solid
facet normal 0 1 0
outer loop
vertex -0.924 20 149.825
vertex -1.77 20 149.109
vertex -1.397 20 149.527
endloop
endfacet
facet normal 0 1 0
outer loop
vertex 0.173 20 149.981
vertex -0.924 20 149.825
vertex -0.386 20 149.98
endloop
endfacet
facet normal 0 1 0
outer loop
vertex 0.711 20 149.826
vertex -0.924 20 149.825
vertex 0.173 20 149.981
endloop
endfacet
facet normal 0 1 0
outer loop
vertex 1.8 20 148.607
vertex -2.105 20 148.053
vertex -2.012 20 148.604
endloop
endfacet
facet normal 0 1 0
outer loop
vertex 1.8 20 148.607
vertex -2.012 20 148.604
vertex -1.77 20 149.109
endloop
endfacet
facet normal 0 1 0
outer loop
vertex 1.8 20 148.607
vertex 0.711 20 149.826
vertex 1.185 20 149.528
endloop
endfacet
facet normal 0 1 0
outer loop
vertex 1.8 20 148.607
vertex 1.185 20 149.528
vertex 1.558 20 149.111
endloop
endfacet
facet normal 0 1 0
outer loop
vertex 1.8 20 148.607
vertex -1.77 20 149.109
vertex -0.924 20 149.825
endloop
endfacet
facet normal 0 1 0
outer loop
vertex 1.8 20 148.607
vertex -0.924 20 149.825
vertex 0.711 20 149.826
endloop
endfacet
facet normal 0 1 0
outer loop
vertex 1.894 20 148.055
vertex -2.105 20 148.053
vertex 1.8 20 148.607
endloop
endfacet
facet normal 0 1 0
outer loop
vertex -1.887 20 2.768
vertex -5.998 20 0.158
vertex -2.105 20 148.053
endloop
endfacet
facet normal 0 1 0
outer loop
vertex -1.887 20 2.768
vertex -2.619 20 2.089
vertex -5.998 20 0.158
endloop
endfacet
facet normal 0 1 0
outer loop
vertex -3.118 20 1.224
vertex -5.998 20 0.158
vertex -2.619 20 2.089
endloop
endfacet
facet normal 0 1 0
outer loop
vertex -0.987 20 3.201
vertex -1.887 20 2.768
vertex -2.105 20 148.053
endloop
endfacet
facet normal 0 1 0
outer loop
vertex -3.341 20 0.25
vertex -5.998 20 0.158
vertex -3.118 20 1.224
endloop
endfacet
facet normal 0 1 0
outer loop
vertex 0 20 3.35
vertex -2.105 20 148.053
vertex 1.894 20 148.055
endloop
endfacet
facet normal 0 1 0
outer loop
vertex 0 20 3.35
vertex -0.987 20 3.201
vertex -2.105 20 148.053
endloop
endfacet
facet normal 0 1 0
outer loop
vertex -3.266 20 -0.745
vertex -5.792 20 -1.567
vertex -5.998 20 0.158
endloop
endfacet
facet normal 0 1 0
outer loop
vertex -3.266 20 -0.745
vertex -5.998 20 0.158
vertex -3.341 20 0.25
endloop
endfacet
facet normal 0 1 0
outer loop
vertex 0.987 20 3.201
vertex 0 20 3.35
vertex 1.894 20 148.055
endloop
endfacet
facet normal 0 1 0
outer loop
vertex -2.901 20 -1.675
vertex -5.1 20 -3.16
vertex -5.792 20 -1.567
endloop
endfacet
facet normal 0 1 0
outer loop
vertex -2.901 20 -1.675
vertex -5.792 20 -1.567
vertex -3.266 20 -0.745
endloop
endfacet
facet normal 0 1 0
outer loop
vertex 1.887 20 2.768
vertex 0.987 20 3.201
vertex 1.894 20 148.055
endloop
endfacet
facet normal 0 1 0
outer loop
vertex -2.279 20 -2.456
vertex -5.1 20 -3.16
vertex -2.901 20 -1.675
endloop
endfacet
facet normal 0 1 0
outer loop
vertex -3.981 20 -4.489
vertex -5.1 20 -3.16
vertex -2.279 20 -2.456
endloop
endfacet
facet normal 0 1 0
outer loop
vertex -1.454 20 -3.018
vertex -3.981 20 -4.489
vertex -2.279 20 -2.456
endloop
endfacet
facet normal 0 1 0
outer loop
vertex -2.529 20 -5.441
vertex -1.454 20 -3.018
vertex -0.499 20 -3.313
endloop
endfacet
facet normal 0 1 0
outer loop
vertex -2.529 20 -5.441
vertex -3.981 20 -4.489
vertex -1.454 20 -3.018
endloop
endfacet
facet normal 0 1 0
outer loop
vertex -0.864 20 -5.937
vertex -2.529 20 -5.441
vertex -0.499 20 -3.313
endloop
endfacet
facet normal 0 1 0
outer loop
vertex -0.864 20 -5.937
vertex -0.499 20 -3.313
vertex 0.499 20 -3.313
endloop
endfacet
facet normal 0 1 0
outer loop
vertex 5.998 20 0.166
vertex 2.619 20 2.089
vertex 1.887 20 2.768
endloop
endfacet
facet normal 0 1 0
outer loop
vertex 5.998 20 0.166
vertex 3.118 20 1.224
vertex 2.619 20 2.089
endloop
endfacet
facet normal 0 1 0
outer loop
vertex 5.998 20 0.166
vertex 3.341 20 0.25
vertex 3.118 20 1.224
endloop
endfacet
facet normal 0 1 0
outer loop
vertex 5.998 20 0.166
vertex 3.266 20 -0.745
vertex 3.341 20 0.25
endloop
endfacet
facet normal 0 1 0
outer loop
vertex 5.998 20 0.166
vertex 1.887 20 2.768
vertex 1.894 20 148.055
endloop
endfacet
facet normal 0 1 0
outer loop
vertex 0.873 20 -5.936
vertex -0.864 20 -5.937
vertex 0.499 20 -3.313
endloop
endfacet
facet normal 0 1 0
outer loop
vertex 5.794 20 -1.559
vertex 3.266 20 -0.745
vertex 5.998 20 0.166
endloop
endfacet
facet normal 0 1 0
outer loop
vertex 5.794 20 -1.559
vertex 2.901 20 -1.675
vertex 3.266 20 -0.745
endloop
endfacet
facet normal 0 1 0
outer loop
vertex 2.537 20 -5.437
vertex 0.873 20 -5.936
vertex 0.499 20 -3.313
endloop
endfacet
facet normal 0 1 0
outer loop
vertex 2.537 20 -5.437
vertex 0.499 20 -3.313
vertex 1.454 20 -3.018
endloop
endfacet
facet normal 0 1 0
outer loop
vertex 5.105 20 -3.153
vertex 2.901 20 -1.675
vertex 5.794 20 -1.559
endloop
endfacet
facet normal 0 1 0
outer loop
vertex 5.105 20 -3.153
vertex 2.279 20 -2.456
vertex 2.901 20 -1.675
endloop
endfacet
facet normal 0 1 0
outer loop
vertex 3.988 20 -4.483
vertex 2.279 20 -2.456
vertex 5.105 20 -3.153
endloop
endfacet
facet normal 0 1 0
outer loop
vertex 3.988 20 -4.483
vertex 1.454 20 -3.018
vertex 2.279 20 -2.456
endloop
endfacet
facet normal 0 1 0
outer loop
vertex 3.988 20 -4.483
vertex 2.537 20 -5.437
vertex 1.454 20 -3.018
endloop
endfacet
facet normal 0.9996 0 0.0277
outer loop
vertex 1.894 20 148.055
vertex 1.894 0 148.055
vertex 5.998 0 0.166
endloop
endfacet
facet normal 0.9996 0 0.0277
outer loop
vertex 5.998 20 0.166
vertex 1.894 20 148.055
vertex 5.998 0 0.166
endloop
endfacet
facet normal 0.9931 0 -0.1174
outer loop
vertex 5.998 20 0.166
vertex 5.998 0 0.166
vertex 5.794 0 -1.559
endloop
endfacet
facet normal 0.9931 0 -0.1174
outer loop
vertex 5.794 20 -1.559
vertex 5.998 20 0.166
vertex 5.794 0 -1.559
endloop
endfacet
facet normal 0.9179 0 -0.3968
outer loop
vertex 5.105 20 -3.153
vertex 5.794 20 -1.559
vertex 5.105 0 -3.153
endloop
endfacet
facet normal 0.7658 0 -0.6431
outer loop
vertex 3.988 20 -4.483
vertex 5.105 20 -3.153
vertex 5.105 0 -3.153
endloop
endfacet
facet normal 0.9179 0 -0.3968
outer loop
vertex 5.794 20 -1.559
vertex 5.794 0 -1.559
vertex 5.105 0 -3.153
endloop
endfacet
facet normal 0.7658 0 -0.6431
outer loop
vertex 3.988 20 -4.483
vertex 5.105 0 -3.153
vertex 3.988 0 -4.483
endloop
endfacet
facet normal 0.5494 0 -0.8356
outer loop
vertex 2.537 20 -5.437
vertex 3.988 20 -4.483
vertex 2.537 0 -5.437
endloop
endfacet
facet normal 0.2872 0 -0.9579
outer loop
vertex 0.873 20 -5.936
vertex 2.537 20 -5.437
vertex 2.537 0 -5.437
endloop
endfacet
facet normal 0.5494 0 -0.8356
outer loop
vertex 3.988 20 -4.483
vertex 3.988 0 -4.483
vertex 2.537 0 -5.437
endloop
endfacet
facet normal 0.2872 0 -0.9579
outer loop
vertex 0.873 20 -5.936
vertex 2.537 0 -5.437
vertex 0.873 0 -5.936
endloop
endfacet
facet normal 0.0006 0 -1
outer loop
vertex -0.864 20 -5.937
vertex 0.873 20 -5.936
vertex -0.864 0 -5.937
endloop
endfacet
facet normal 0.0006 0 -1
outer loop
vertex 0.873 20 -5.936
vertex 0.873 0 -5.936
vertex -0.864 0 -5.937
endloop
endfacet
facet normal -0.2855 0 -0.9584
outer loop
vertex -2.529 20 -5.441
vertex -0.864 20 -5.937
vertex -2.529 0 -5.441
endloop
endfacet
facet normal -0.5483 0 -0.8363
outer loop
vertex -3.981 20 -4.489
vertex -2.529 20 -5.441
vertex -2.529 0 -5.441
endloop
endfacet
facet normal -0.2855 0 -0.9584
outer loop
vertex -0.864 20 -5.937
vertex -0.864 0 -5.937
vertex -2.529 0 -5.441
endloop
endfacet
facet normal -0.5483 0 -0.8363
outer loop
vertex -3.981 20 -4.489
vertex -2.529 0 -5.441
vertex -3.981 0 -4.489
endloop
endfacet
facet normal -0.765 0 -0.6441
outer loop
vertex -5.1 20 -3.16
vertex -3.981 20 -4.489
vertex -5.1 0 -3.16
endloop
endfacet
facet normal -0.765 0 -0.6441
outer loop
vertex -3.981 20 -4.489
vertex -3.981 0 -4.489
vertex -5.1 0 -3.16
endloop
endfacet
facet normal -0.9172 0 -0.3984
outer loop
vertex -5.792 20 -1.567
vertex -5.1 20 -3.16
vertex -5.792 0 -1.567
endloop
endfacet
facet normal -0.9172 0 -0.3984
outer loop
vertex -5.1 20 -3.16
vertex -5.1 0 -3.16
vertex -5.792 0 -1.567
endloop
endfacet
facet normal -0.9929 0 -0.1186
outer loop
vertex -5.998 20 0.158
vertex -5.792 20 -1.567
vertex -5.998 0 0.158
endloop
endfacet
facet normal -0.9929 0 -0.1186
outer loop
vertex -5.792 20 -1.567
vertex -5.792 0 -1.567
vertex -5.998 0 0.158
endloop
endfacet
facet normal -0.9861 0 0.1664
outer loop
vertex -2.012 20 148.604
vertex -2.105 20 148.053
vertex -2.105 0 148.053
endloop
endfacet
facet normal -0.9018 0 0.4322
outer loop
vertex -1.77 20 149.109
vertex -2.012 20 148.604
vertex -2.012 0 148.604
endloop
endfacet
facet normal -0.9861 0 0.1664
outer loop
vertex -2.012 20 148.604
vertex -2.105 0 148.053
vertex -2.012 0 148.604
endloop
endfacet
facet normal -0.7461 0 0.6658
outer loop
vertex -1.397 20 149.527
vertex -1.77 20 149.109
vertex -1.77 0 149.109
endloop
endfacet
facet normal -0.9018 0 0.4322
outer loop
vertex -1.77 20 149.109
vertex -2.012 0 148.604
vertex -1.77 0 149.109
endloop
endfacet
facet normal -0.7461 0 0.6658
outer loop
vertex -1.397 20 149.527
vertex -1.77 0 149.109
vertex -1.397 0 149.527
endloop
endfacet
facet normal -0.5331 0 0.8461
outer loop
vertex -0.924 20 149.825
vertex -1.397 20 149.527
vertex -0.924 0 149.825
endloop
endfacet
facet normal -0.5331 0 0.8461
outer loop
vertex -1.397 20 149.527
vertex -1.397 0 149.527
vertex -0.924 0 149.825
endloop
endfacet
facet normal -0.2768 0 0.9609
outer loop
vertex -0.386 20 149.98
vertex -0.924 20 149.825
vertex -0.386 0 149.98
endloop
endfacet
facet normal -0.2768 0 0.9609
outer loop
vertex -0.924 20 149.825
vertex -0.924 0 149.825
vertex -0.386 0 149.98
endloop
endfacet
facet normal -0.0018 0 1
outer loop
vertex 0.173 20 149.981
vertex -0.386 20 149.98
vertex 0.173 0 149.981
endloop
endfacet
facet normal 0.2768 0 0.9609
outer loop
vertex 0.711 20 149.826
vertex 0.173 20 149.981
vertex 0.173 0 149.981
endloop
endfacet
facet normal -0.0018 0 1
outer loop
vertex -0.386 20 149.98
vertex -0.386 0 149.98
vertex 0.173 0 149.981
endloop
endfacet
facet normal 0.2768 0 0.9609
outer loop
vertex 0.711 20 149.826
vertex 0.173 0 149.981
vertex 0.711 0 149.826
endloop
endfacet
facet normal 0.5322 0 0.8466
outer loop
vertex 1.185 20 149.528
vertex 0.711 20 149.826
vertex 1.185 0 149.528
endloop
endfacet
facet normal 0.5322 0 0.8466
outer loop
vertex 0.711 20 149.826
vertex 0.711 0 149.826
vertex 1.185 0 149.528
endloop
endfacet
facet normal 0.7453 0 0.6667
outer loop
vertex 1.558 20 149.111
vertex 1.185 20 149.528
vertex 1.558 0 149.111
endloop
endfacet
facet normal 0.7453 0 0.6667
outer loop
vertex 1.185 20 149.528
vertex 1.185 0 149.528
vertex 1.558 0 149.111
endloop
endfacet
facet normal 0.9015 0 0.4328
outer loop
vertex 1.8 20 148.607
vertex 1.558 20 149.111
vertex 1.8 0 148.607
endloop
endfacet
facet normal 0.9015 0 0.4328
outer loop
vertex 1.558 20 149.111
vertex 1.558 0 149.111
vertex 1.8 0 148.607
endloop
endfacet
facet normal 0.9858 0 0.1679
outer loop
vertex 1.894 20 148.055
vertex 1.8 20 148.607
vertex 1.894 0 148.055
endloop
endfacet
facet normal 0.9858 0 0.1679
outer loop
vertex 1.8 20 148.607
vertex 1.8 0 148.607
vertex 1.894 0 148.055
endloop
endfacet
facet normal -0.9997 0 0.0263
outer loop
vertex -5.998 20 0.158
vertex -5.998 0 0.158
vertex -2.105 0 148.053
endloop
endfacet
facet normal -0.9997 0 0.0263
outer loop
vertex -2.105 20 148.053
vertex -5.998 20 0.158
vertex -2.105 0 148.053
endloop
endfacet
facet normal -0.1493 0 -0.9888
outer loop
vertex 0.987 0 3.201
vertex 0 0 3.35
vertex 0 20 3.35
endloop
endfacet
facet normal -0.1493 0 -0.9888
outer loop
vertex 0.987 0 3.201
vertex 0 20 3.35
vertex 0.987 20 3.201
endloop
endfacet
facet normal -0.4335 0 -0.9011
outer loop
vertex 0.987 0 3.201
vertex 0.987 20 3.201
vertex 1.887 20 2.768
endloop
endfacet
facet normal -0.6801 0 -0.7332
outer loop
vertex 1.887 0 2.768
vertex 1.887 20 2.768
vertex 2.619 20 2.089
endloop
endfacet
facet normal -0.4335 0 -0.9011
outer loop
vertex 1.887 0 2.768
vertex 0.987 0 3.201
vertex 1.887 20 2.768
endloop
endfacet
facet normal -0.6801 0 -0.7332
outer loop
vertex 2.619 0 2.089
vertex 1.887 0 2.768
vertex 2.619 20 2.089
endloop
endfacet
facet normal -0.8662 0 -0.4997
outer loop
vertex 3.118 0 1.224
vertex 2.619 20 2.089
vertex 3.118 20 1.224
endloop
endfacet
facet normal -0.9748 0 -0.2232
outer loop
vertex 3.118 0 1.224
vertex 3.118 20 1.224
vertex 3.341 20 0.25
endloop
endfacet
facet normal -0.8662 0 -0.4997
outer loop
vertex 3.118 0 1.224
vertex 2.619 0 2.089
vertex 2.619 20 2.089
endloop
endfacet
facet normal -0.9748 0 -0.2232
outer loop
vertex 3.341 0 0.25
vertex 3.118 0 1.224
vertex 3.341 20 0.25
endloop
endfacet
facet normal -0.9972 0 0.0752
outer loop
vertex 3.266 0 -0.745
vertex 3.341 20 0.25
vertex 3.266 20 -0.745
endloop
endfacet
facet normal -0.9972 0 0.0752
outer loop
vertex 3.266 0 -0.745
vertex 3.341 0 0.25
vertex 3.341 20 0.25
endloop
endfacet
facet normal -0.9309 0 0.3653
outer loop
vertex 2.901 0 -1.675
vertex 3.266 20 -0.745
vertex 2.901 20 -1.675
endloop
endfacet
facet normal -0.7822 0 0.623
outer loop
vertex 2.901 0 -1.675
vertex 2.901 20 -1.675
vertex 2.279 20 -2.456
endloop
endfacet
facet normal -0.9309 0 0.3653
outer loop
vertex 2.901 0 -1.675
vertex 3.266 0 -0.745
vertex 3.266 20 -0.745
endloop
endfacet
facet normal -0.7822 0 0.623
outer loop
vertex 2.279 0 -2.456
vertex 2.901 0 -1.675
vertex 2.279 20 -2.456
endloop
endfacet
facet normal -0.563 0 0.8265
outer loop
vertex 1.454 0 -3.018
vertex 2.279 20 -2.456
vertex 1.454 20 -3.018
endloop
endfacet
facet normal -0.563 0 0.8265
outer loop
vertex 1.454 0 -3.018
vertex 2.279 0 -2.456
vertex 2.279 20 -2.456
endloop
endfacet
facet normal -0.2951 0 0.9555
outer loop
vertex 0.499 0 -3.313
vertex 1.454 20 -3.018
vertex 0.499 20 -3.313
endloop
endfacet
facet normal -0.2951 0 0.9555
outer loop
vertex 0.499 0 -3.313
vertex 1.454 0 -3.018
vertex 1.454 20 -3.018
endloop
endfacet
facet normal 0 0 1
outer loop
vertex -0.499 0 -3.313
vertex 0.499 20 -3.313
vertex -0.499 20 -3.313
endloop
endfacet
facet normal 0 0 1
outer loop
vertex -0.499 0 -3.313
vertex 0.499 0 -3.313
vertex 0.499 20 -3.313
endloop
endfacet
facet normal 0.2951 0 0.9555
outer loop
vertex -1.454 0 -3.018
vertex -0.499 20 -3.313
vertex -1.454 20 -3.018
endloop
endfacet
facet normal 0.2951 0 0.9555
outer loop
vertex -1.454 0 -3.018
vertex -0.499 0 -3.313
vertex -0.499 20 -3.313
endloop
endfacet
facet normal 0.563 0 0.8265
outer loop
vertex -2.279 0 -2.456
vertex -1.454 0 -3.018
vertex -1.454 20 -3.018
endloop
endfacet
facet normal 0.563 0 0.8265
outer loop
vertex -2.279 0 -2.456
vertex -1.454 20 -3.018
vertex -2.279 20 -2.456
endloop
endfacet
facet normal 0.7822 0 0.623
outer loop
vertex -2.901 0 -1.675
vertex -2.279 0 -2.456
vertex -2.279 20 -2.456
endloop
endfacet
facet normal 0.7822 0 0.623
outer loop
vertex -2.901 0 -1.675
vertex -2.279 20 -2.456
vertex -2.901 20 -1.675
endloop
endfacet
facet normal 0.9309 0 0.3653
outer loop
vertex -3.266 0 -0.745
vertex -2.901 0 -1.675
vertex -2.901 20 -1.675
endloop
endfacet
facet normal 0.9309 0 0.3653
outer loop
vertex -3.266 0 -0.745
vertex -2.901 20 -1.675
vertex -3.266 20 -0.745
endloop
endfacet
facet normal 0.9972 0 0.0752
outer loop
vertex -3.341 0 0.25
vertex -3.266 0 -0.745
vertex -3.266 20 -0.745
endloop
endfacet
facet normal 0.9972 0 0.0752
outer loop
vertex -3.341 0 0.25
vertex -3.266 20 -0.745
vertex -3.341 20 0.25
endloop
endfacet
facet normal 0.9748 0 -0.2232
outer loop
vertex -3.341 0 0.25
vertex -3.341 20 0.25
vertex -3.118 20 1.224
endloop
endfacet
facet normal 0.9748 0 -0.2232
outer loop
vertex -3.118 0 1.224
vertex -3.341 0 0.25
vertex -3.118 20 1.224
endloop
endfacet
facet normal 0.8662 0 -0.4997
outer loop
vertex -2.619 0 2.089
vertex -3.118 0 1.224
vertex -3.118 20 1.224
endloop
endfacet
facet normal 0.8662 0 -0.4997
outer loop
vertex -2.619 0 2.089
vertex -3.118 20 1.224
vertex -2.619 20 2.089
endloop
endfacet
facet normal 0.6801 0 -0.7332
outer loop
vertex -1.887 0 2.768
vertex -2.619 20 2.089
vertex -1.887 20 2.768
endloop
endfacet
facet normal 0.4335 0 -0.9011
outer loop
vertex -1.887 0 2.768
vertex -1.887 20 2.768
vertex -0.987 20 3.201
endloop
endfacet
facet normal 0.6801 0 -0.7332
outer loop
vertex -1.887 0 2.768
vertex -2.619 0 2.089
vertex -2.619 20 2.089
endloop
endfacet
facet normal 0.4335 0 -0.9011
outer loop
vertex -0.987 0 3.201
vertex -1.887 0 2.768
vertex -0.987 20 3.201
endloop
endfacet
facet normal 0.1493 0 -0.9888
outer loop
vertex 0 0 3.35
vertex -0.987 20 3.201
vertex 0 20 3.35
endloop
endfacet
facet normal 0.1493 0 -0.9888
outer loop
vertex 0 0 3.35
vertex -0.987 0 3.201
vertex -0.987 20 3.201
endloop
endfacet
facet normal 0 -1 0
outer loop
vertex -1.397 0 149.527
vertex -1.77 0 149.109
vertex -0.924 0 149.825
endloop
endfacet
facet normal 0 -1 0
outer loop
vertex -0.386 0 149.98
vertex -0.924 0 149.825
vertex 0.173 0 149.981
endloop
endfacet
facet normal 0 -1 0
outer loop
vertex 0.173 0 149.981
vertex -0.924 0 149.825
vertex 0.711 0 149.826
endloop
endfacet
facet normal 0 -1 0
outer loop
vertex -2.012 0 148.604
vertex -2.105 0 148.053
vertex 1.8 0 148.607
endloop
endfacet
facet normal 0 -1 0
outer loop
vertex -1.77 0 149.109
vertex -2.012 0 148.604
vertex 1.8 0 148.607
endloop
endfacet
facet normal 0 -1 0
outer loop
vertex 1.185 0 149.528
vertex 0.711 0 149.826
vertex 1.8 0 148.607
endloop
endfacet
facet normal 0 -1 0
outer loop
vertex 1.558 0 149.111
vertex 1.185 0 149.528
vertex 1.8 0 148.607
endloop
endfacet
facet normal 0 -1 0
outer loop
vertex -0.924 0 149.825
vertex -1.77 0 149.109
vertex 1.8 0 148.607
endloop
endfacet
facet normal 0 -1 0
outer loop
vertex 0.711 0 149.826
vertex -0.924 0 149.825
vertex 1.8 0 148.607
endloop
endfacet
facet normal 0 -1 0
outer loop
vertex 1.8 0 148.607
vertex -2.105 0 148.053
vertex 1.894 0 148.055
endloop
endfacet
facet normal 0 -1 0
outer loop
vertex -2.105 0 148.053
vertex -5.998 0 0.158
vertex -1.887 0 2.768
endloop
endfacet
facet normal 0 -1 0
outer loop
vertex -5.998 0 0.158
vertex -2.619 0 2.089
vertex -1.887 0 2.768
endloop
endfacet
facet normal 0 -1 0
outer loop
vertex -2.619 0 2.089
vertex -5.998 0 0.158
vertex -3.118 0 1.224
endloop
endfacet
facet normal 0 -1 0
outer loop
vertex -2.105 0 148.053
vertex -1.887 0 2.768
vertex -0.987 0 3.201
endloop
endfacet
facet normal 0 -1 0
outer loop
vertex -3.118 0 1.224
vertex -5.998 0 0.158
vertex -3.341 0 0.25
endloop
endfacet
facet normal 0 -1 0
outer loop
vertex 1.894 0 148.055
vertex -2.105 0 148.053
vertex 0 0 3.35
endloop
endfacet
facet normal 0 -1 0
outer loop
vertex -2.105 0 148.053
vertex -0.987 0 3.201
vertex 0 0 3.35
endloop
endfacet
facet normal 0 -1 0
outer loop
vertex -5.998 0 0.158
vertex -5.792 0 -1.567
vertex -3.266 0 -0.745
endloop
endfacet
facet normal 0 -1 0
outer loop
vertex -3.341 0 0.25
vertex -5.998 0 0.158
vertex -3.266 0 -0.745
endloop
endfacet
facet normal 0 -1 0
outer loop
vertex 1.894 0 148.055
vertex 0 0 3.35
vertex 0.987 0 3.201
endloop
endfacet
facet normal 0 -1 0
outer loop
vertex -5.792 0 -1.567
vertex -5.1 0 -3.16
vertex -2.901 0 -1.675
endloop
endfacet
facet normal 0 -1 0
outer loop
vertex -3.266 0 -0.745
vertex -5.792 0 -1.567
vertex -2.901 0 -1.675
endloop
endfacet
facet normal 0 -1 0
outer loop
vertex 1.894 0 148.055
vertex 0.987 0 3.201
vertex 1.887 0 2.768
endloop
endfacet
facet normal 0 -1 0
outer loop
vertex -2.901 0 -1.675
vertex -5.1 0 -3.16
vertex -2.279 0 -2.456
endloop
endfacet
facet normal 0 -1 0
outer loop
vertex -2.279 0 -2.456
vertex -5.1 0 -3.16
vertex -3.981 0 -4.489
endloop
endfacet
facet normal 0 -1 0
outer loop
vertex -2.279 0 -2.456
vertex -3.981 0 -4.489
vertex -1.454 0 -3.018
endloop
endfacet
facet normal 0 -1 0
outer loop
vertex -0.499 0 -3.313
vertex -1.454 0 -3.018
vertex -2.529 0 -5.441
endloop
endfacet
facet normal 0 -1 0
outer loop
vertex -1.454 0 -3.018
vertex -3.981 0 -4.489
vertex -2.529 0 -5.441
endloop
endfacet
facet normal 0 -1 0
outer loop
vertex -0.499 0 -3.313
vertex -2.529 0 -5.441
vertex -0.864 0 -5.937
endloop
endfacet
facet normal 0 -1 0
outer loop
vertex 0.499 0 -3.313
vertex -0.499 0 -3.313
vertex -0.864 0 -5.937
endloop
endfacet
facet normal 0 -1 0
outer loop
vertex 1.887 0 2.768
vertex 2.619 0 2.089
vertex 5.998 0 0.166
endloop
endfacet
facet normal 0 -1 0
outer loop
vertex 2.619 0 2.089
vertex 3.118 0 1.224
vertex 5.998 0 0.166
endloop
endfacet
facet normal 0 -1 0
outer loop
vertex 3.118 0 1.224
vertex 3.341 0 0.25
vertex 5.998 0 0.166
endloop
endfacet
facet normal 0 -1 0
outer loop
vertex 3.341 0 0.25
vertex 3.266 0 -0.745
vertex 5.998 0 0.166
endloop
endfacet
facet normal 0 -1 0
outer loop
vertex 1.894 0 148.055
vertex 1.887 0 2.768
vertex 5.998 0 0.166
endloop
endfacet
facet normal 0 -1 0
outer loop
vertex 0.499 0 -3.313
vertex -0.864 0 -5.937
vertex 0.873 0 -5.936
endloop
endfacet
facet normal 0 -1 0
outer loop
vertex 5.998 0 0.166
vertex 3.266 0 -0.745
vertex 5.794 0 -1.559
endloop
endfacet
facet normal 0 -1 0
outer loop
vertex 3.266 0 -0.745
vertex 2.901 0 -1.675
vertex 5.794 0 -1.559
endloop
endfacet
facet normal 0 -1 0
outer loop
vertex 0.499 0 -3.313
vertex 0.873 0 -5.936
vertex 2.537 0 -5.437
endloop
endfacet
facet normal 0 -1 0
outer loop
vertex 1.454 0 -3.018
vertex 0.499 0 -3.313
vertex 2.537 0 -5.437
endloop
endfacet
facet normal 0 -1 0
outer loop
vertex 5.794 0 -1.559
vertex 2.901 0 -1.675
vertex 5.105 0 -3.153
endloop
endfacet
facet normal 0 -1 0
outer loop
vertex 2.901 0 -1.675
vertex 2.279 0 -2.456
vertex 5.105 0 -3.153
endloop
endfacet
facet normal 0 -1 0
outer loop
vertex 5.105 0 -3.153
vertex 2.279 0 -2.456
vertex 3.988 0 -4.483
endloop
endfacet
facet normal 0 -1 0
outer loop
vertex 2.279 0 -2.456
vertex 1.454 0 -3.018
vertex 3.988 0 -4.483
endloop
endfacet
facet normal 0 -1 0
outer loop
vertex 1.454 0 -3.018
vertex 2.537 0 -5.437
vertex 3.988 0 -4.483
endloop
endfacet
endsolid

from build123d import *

# Parameters (mm, degrees)
SKETCH_1_R      = 3.35
EXTRUDE_1_DEPTH = 20


with BuildPart() as part:
    # 草图1 → 凸台-拉伸1 (new body)
    with BuildSketch(Plane(origin=(0, 0, 0), x_dir=(1, 0, 0), z_dir=(0, 1, 0))):
        with BuildLine():
            Line((-5.997922074, -0.157894881), (-2.104603424, -148.052632133))
            ThreePointArc((-2.104603424, -148.052632133), (-0.106718985, -150), (1.893934378, -148.055476932))
            Line((1.893934378, -148.055476932), (5.99769133, -0.166429278))
            ThreePointArc((5.99769133, -0.166429278), (0.004268758, 5.999998481), (-5.997922074, -0.157894881))
        make_face()
        with Locations(Location((0, 0, 0), (0, 0, 270))):
            Circle(SKETCH_1_R, mode=Mode.SUBTRACT)
    extrude(amount=EXTRUDE_1_DEPTH)


solid = part.part
